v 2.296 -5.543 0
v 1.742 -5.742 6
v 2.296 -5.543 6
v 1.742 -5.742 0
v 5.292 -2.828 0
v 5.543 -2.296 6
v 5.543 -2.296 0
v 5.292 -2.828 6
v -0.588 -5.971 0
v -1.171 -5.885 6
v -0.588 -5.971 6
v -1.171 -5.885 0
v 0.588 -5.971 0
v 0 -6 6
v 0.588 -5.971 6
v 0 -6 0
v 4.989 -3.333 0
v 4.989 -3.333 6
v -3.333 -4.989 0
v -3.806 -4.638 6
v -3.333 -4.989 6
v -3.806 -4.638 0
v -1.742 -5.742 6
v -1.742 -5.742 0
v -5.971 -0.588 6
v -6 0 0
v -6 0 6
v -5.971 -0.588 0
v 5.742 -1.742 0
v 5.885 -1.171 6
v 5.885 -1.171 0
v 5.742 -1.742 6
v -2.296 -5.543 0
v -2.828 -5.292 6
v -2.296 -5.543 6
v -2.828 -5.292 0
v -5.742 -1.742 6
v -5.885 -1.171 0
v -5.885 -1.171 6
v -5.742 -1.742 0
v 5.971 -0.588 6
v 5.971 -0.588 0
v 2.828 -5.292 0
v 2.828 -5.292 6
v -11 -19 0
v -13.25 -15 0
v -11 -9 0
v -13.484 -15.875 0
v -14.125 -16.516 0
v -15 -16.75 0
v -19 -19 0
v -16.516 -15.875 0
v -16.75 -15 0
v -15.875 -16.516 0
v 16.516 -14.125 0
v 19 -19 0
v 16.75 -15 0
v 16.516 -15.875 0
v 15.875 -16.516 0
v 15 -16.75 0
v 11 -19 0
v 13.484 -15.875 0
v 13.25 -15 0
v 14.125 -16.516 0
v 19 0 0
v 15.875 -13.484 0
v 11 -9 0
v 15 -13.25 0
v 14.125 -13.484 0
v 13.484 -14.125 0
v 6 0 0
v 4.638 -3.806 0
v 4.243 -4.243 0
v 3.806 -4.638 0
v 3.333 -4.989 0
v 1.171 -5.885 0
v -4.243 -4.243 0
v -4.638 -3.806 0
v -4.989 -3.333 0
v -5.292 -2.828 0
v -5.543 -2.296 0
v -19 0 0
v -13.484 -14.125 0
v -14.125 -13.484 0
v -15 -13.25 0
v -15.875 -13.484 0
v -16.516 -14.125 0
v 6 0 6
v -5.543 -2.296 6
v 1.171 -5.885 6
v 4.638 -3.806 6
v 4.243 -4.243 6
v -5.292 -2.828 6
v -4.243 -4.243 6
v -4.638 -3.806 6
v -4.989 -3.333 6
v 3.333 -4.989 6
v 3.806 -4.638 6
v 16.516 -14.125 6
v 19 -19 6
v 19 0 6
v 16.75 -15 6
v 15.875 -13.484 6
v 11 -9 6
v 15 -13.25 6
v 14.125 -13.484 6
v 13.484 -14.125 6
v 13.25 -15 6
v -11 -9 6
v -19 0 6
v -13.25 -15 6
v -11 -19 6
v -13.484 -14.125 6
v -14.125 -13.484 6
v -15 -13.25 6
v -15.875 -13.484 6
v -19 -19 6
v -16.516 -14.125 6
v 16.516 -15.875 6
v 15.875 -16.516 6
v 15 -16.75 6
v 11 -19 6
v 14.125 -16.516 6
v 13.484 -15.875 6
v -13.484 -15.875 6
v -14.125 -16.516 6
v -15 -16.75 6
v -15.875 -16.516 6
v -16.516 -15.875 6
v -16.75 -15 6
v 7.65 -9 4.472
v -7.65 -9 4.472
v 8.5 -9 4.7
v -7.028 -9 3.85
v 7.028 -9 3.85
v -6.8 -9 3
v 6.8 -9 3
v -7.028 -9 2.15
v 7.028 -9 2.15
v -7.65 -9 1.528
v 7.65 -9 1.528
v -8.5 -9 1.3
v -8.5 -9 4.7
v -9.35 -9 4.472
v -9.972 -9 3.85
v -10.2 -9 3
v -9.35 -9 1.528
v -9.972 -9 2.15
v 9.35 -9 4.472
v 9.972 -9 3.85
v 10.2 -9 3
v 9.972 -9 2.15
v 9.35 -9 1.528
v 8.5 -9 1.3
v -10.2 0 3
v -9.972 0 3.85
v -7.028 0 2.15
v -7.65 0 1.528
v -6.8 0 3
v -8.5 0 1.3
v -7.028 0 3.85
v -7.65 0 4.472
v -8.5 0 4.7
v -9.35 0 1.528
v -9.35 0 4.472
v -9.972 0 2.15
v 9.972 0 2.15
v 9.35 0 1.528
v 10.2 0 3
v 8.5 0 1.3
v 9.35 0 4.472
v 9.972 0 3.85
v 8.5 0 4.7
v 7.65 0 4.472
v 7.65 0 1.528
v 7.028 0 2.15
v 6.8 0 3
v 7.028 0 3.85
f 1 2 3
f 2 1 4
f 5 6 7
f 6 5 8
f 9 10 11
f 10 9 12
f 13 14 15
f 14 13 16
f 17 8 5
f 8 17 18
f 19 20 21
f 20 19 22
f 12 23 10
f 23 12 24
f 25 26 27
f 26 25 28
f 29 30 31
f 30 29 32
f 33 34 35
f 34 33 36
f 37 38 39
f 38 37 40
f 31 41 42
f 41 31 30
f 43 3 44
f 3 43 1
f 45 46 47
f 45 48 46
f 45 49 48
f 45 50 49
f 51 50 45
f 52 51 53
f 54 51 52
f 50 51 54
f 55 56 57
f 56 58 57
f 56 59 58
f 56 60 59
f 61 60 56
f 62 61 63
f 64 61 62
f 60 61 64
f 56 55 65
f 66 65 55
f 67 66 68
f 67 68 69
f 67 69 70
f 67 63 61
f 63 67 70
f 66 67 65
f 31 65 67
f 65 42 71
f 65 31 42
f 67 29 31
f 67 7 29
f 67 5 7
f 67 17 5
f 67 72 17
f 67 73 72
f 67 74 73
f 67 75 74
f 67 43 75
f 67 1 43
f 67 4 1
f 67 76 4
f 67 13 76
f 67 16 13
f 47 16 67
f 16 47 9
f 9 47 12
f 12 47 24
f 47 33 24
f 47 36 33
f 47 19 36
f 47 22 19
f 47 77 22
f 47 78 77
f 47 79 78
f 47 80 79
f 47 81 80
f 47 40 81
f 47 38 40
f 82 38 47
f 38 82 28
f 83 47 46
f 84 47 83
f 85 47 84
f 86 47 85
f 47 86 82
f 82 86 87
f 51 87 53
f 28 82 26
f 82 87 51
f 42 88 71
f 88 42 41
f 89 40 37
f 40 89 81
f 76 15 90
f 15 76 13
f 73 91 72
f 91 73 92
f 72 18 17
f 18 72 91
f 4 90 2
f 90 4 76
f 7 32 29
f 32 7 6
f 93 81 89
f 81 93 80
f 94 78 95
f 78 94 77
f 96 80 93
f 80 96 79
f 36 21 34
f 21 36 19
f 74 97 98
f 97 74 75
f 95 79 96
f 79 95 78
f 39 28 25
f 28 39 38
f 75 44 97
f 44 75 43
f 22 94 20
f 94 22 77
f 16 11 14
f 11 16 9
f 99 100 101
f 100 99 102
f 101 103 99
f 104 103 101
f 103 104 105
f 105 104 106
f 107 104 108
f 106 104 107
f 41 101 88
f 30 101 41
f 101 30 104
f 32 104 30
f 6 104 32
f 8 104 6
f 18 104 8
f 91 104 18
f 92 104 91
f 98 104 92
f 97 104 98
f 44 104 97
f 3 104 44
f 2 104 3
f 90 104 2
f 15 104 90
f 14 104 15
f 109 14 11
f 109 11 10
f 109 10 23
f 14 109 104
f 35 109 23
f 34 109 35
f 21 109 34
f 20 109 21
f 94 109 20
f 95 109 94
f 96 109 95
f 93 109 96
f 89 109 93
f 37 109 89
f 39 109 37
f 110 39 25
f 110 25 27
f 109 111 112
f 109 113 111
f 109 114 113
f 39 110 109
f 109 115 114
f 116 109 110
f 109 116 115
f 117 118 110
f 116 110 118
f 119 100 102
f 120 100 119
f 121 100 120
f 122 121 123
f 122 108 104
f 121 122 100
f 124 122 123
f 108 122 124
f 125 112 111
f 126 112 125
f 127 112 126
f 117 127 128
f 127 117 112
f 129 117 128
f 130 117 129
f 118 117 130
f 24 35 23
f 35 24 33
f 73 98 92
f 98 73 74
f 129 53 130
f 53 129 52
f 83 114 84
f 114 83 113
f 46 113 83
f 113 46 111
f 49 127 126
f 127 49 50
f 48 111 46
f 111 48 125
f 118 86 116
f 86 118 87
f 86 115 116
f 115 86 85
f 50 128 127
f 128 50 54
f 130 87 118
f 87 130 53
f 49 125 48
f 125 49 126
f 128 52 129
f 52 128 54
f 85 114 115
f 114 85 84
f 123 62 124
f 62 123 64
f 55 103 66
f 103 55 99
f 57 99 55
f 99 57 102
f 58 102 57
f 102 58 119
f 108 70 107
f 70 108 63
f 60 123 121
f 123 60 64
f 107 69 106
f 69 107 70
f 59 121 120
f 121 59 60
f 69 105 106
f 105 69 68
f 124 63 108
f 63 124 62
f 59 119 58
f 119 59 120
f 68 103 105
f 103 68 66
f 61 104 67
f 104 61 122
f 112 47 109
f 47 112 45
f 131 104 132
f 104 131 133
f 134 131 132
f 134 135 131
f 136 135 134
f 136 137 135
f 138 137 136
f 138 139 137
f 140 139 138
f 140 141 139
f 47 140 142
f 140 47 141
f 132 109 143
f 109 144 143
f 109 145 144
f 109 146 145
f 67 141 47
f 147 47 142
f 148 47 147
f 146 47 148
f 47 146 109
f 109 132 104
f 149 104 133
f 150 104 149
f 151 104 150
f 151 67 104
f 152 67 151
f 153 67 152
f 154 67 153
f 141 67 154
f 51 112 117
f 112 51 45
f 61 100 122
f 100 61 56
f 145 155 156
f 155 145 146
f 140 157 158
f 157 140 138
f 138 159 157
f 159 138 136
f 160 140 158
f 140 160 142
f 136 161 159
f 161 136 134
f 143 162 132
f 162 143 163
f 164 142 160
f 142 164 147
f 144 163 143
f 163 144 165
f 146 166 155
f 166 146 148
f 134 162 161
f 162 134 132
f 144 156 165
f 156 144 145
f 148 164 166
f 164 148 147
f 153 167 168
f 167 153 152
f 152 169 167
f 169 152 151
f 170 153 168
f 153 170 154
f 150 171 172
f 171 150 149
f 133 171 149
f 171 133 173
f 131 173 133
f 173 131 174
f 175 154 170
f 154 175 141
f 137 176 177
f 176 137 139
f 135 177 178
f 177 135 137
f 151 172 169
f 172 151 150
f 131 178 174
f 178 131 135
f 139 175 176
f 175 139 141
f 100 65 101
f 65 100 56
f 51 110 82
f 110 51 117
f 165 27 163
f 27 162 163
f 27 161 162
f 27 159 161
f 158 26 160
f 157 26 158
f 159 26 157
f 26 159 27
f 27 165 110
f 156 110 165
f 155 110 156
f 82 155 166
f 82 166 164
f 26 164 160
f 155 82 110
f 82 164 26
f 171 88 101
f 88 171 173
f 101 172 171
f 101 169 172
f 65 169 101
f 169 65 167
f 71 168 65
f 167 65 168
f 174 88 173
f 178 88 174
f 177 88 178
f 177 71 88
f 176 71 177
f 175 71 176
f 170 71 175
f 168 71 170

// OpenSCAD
difference()
{
    union()
    {
        translate([-19,-19,0])
            cube([38,19,6]);
    }
    union()
    {
        cylinder(d=12,h=6,$fn=64);
        
        translate([-15,-15,0])
            cylinder(d=3.5,h=6,$fn=12);
        translate([15,-15,0])
            cylinder(d=3.5,h=6,$fn=12);
        
        translate([-11,-19,0])
            cube([22,10,6]);
        
        translate([-11+2.5,-9,3])
            rotate([270,0,0])
                cylinder(d=3.4,h=20,$fn=12);
        translate([11-2.5,-9,3])
            rotate([270,0,0])
                cylinder(d=3.4,h=20,$fn=12);
    }
}
